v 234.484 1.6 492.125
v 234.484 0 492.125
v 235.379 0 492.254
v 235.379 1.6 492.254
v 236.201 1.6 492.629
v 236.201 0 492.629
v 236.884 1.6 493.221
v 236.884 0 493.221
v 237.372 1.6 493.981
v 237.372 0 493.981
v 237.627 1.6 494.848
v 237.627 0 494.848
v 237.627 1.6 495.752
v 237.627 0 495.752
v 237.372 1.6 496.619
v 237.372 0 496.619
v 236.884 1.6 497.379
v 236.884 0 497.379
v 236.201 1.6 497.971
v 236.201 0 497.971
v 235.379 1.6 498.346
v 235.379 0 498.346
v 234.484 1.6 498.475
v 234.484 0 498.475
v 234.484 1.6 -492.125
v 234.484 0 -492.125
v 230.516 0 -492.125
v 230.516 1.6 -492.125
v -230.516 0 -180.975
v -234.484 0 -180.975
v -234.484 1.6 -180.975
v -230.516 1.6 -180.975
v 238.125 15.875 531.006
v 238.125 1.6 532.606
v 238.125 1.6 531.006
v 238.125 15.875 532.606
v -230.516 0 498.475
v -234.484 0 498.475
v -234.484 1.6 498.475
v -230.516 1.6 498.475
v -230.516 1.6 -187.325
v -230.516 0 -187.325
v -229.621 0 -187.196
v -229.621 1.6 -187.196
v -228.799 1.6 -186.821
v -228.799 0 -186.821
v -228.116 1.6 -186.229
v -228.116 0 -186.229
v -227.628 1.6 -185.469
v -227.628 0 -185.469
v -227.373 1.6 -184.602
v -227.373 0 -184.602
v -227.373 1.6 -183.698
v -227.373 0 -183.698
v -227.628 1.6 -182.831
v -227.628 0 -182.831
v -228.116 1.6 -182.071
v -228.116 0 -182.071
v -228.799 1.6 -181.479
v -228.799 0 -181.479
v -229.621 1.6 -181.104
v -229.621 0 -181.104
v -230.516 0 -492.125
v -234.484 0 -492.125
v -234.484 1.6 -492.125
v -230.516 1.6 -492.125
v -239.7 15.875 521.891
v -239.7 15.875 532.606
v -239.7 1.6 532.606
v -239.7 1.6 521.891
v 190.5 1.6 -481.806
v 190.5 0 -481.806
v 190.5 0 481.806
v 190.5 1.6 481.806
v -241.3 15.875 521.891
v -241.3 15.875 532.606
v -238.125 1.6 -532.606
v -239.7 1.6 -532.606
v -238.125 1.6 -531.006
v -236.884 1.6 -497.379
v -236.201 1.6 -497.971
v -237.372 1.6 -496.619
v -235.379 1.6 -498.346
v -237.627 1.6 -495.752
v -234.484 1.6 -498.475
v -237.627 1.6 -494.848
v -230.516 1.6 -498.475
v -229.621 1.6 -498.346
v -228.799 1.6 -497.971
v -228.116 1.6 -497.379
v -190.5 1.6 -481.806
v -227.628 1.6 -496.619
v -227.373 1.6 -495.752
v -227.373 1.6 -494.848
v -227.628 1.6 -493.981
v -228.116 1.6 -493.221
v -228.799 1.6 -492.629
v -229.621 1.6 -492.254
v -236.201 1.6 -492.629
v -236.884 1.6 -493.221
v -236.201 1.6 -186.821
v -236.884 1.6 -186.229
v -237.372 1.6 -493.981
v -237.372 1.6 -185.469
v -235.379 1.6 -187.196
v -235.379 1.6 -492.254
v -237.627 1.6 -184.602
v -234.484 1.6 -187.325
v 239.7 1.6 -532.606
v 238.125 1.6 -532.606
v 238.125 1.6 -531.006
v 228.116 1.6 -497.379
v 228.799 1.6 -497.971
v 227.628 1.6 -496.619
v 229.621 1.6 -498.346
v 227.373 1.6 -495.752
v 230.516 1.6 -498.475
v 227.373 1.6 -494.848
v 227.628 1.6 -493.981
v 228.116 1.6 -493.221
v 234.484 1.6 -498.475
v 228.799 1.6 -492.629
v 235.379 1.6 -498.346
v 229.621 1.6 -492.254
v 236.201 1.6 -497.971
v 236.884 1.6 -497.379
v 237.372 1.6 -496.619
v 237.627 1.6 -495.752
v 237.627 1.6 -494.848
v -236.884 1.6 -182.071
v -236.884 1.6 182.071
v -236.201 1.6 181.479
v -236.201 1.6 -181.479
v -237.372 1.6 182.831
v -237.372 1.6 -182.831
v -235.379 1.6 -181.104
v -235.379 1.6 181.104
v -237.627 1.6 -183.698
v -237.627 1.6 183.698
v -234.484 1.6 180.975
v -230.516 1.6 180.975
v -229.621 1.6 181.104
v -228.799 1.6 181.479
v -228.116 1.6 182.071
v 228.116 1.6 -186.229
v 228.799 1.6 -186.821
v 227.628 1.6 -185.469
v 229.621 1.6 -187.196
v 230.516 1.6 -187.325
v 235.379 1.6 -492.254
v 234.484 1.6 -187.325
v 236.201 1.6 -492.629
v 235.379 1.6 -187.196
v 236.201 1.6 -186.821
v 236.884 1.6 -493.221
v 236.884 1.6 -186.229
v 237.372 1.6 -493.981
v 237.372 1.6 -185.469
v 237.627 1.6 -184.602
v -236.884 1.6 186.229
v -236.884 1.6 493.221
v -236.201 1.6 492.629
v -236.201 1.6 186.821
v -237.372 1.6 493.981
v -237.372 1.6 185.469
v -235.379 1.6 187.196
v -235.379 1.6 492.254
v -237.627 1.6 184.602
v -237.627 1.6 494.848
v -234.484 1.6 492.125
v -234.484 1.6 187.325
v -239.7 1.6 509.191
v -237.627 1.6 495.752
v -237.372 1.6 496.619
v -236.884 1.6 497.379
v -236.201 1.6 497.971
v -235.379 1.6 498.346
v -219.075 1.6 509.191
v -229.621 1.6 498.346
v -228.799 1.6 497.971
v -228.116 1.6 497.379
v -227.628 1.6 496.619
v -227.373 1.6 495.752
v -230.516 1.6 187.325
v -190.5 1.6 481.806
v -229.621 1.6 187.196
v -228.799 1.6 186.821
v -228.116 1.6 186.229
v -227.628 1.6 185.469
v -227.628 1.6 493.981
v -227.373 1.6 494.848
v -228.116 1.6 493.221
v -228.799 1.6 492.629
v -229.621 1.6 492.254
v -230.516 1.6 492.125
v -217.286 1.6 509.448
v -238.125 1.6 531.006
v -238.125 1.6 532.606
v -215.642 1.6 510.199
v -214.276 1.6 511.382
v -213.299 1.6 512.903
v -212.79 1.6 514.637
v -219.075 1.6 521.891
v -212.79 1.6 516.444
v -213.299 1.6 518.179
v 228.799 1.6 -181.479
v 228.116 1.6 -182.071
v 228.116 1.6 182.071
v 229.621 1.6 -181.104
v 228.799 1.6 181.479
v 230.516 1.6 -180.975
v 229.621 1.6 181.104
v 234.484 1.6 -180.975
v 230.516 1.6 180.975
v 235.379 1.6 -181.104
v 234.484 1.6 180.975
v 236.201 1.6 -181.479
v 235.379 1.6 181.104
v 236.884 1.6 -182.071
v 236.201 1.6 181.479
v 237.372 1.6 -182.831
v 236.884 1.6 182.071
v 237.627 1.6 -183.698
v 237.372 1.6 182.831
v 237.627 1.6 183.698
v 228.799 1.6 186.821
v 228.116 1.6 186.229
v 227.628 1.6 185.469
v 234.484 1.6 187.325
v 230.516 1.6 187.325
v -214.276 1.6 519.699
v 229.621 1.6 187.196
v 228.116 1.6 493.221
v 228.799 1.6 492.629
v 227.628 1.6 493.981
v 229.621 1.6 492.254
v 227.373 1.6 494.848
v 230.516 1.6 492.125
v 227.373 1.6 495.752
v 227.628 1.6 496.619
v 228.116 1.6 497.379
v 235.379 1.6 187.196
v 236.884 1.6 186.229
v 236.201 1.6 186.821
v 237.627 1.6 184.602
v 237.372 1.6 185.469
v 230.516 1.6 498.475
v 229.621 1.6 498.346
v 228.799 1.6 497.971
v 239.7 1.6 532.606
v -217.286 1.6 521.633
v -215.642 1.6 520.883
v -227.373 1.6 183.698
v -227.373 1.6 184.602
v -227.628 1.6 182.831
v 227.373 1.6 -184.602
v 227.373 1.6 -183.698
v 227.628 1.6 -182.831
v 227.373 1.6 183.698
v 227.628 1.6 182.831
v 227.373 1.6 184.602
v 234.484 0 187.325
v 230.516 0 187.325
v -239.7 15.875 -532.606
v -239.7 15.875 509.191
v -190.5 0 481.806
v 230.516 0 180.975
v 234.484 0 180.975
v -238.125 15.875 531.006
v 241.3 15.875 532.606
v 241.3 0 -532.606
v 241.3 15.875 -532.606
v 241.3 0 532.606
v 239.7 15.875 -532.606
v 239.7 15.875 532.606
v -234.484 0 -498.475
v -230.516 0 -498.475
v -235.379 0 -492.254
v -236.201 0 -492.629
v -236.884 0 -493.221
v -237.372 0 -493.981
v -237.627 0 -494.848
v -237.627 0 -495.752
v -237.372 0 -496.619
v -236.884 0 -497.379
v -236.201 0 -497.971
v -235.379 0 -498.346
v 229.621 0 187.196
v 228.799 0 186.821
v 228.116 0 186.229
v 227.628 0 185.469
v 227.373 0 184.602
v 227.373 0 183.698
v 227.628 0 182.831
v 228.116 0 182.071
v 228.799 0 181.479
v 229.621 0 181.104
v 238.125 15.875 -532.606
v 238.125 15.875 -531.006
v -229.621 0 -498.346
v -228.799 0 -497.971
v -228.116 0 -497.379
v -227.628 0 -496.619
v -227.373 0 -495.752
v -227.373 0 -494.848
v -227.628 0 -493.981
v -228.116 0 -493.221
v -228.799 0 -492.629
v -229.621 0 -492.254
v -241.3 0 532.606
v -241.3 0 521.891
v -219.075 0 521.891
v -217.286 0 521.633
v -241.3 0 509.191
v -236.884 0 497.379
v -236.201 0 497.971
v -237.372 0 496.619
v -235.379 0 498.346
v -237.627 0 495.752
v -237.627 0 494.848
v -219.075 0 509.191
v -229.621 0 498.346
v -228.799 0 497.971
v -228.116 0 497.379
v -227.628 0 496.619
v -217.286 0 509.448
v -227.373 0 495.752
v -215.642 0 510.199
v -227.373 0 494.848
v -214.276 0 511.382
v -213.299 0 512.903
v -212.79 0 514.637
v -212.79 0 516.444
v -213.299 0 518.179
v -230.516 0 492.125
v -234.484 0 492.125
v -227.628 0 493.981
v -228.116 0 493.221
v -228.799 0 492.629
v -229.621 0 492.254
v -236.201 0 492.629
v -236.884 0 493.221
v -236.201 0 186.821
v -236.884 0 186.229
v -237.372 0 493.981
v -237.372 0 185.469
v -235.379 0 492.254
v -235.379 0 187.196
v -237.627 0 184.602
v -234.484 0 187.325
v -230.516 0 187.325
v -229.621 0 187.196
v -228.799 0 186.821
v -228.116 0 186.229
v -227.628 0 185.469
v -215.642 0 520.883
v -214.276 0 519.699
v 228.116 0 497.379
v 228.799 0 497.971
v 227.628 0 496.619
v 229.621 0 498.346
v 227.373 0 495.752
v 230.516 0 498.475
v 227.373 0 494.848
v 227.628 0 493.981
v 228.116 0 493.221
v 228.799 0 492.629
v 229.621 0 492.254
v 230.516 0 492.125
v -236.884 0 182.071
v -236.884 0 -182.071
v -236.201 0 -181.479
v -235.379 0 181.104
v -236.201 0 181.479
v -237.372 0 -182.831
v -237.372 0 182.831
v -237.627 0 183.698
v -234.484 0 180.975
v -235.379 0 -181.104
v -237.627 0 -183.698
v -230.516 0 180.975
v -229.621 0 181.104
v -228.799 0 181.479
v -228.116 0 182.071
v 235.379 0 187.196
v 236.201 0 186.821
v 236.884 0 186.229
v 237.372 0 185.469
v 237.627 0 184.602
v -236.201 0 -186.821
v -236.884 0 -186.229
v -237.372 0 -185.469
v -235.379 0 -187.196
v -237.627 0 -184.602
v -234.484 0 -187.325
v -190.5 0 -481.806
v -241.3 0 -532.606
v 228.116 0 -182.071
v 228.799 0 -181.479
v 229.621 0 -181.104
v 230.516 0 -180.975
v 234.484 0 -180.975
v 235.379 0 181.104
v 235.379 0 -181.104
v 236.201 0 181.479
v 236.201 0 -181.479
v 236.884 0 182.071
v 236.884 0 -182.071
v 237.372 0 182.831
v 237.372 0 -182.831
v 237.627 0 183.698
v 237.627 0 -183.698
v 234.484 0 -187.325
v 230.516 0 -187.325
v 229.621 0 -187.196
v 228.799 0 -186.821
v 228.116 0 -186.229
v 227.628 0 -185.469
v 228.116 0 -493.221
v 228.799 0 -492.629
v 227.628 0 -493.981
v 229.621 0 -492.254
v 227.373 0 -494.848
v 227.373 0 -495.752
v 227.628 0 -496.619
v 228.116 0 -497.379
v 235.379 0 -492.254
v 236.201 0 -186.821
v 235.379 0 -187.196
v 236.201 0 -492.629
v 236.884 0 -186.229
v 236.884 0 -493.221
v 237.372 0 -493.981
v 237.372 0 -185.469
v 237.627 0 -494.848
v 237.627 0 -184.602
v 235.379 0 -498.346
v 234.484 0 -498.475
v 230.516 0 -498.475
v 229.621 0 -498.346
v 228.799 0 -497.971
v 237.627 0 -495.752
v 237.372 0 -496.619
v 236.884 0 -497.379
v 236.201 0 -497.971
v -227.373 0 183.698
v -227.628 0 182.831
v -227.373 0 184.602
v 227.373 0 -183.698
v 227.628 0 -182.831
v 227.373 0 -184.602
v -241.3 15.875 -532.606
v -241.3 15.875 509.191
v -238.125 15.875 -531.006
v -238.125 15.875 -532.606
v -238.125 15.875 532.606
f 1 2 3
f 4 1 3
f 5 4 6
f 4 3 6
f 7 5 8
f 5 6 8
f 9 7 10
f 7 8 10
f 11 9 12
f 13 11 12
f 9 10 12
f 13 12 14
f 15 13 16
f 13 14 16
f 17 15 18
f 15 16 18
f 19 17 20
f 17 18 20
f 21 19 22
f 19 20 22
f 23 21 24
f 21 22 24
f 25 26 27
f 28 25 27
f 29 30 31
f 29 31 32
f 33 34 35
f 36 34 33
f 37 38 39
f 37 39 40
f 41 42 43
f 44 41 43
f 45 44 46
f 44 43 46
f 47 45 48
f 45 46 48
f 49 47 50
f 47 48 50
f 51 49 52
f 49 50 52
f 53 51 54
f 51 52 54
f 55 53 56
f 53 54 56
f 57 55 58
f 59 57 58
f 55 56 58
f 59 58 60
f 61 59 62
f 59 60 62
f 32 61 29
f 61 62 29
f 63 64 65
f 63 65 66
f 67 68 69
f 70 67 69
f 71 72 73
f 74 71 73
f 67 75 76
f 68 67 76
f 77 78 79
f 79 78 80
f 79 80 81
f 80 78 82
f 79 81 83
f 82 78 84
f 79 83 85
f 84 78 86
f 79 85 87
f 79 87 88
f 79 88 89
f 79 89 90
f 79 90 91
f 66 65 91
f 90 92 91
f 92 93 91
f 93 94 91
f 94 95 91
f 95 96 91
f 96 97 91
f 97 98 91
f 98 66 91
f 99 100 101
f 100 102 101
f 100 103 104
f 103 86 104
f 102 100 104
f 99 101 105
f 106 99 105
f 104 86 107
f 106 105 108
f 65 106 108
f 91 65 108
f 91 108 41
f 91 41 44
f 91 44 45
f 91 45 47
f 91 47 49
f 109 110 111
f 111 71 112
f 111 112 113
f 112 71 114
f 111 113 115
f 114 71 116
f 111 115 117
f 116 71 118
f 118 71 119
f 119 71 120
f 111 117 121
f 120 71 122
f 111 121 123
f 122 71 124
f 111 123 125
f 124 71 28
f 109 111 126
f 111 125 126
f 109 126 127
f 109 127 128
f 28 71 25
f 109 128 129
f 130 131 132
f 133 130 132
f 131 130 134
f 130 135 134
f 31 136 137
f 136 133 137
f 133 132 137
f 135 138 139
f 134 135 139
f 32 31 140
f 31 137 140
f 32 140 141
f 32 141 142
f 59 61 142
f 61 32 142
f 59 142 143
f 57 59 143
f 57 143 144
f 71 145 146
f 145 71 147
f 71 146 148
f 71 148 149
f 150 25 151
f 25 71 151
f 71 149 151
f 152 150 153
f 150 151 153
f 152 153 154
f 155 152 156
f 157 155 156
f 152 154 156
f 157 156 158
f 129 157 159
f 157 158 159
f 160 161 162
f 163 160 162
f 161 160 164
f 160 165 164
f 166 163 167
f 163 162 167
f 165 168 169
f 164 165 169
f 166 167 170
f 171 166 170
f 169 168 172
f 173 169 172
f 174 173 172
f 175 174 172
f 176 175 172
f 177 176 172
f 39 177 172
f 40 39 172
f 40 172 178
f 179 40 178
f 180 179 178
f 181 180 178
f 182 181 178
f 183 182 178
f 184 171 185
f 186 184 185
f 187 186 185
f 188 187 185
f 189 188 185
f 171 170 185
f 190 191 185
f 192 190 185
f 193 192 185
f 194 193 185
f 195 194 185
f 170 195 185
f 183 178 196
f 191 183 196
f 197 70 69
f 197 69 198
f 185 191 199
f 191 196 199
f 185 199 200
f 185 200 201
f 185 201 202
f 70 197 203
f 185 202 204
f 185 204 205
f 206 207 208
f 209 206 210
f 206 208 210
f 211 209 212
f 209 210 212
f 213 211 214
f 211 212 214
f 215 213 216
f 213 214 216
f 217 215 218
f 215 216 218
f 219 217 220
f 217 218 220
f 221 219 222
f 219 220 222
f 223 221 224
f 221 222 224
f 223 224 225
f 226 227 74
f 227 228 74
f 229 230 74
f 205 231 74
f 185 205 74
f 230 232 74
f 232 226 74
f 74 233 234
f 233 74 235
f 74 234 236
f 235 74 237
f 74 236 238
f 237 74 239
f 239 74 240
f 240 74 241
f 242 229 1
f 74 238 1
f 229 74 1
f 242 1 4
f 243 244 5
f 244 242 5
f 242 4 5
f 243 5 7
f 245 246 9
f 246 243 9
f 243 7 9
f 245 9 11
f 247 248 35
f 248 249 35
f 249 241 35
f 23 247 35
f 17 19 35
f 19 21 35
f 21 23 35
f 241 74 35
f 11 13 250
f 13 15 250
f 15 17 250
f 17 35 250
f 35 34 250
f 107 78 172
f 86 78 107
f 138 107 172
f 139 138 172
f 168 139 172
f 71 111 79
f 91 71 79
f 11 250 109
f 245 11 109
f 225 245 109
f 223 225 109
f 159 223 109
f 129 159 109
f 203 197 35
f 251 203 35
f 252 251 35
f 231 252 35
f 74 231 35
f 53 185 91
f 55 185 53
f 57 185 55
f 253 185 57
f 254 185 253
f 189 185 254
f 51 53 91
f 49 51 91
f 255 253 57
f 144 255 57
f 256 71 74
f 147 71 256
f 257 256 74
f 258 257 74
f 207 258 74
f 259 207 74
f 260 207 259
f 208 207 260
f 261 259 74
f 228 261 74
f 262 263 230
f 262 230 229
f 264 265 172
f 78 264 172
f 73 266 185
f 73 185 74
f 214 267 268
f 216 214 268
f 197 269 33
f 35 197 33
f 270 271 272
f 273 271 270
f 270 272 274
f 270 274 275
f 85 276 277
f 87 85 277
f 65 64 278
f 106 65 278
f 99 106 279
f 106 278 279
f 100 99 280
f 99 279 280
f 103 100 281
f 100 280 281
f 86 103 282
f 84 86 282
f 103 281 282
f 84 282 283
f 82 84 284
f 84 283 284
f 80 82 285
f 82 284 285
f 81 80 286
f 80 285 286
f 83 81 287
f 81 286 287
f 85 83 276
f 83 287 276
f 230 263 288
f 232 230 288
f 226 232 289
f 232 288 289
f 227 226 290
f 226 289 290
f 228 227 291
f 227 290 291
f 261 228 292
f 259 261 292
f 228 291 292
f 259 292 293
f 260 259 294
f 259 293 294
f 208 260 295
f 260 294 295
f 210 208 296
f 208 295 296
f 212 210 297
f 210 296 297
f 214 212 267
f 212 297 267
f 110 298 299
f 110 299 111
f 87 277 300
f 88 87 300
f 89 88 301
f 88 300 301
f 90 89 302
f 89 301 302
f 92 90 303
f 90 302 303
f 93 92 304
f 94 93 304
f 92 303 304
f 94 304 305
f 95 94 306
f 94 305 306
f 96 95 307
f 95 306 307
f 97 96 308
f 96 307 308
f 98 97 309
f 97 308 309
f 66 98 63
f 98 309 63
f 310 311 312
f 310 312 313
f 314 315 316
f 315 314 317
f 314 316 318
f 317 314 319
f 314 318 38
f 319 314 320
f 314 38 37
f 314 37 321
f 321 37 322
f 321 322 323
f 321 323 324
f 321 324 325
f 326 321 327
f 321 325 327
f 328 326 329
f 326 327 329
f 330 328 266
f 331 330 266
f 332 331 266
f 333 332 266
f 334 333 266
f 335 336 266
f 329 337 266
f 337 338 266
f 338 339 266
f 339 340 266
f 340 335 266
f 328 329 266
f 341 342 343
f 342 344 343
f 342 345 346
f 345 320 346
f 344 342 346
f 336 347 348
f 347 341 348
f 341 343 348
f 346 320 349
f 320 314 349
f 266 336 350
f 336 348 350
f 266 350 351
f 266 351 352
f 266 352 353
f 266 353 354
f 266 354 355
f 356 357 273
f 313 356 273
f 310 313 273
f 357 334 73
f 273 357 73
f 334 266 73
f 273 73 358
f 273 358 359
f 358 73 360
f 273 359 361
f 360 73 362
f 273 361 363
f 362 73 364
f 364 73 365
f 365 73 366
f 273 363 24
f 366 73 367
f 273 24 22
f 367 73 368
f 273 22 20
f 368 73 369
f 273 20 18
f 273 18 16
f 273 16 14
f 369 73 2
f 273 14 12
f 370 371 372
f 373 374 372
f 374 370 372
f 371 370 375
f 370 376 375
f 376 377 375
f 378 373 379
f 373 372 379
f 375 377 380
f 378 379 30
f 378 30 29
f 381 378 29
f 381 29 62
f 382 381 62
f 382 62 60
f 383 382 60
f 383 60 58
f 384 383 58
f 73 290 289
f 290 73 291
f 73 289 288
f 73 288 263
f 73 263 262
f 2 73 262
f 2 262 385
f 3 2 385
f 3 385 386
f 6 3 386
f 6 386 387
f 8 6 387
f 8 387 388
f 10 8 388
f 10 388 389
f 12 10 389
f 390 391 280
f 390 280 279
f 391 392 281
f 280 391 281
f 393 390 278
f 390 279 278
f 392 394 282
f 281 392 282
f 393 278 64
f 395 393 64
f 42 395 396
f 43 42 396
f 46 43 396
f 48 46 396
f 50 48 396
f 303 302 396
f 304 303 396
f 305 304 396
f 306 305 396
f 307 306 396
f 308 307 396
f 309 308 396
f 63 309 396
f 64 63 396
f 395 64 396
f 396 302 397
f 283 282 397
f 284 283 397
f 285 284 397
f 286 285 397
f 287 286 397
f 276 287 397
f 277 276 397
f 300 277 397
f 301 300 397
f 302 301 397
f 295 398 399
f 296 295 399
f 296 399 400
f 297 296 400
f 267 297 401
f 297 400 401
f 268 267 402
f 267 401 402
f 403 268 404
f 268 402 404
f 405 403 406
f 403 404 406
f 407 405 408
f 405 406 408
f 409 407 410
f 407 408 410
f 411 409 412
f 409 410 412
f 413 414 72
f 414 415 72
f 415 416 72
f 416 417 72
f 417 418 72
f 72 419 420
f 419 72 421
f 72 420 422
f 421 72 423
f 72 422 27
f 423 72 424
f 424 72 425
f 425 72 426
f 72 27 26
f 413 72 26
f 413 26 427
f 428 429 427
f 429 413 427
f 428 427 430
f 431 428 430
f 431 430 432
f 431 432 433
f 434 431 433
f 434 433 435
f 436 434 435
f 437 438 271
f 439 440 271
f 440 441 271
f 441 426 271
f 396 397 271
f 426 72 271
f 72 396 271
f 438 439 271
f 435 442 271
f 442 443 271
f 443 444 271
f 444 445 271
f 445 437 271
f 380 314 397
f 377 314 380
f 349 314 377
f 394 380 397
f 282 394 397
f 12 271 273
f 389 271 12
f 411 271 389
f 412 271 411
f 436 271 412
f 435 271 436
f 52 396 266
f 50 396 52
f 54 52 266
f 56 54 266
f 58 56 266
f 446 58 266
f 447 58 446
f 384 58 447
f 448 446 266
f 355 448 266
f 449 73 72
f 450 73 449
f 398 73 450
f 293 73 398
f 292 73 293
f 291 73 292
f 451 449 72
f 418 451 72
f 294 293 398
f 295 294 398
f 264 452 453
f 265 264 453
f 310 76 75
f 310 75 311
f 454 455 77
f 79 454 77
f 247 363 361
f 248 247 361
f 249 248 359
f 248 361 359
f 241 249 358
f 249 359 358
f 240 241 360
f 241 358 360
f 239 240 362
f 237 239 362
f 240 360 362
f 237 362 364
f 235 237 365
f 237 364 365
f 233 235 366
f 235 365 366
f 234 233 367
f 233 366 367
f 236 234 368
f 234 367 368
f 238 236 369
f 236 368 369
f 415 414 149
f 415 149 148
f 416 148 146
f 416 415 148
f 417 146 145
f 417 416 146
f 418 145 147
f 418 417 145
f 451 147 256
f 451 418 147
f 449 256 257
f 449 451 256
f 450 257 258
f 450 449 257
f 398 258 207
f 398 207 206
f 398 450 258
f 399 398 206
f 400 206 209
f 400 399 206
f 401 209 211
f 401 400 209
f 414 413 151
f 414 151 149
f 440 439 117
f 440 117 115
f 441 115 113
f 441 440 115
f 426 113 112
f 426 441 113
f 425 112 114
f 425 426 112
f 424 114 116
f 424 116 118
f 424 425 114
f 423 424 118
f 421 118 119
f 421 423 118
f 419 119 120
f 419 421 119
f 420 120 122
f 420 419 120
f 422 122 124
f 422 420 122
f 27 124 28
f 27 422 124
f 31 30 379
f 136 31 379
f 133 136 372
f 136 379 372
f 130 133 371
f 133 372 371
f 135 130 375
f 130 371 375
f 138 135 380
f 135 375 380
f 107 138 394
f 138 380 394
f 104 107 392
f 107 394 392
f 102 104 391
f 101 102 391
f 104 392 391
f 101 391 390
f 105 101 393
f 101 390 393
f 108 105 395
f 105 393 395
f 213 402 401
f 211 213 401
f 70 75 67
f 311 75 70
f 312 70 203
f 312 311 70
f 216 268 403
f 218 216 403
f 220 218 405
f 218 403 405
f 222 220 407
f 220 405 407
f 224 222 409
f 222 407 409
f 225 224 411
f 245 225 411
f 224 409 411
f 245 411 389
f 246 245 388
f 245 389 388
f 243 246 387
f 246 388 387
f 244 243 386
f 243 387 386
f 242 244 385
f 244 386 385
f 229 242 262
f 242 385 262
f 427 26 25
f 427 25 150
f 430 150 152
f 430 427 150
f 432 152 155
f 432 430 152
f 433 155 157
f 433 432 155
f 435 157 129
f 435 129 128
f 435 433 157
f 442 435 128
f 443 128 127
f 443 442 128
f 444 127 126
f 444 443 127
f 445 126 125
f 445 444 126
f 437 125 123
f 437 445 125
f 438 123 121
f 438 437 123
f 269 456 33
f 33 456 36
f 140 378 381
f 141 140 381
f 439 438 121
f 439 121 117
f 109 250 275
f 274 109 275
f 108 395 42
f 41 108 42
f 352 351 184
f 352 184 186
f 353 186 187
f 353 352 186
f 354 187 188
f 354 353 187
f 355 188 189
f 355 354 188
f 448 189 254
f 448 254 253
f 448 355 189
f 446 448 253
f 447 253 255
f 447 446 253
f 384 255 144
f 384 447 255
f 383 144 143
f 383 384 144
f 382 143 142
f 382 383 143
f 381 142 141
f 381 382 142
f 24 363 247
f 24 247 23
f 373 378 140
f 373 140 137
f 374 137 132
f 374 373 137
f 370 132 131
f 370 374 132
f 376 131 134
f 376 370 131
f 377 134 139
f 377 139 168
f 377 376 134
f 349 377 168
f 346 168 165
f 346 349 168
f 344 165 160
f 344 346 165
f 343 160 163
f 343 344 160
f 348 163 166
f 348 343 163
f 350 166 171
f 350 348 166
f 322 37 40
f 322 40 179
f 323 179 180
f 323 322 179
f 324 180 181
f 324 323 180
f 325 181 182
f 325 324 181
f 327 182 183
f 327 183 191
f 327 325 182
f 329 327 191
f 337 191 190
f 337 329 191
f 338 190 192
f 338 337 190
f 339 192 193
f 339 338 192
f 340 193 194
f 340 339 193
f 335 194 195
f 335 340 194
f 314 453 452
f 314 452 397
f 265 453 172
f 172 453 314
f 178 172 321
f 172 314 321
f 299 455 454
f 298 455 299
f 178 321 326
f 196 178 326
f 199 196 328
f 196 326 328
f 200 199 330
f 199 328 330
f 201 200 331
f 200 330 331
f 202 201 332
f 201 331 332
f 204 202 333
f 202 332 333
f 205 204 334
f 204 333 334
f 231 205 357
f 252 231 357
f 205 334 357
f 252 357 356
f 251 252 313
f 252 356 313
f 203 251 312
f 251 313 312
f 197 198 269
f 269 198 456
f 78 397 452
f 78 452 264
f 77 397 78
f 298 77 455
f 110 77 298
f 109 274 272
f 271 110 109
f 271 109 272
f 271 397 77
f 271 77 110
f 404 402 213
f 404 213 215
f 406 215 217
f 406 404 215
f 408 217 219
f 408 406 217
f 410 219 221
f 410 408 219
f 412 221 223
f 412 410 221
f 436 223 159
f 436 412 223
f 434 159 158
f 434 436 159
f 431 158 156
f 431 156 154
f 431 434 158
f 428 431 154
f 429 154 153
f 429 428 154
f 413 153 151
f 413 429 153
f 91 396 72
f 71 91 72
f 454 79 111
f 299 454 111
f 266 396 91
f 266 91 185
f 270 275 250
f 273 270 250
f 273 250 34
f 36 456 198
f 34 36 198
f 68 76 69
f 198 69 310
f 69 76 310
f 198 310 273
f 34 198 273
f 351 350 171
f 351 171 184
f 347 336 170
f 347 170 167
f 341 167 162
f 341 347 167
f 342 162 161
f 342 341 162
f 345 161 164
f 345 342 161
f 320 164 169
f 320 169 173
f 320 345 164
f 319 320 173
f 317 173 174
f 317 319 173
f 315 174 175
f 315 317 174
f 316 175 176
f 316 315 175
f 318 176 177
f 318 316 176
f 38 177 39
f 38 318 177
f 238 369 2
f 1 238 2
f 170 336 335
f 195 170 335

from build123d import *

# Parameters (mm, degrees)
F0_W              = 482.6
F0_H              = 1065.2125
F1_DEPTH          = 1.6
F2_W              = 15.875
F2_H              = 1065.2125
F3_DEPTH          = 1.6
F4_W              = 15.875
F4_H              = 1065.2125
F5_DEPTH          = 1.6
F6_W              = 476.25
F6_H              = 15.875
F7_DEPTH          = 1.6
F8_W              = 476.25
F8_H              = 15.875
F9_DEPTH          = 1.6
F10_W             = 381
F10_H             = 963.6125
F11_DEPTH         = 1.6
F12_W             = 3.96875
F12_H             = 6.35
F13_DEPTH         = 1.6
F13_COPIES3_COUNT = 2
F13_COPIES3_PITCH = 1094.309536
F13_COPIES4_COUNT = 2
F13_COPIES4_PITCH = 823.333045
F14_W             = 3.96875
F14_H             = 6.35
F15_DEPTH         = 1.6
F16_W             = 22.225
F16_H             = 12.7
F17_DEPTH         = 16


# Not quite as in the source:
# - a pattern or mirror of a feature is missing from the dataset's text; its kind, count and spacing are read off the source's solid


with BuildPart() as f1:
    # F0 (on Front) → F1 (new body)
    with BuildSketch(Plane.XZ):
        Rectangle(F0_W, F0_H)
    extrude(amount=-F1_DEPTH)

    # F2 (on face) → F3 (join)
    with BuildSketch(Plane(origin=(-241.3, 0, 0), x_dir=(0, -1, 0), z_dir=(-1, 0, 0))):
        with Locations((-7.9375, 0)):
            Rectangle(F2_W, F2_H)
    extrude(amount=-F3_DEPTH)

    # F4 (on face) → F5 (join)
    with BuildSketch(Plane.YZ.offset(241.3)):
        with Locations((7.9375, 0)):
            Rectangle(F4_W, F4_H)
    extrude(amount=-F5_DEPTH)

    # F6 (on face) → F7 (join)
    with BuildSketch(Plane.XY.offset(532.60625)):
        with Locations((0, 7.9375)):
            Rectangle(F6_W, F6_H)
    extrude(amount=-F7_DEPTH)

    # F8 (on face) → F9 (join)
    with BuildSketch(Plane(origin=(0, 0, -532.60625), x_dir=(1, 0, 0), z_dir=(0, 0, -1))):
        with Locations((0, -7.9375)):
            Rectangle(F8_W, F8_H)
    extrude(amount=-F9_DEPTH)

    # F10 (on face) → F11 (cut)
    with BuildSketch(Plane.XZ):
        Rectangle(F10_W, F10_H)
    extrude(amount=-F11_DEPTH, mode=Mode.SUBTRACT)

    # F12 (on face) → F13 (cut)
    with BuildSketch(Plane.XZ):
        with Locations((-232.5, -495.3)):
            Rectangle(F12_W, F12_H)
        with BuildLine():
            Line((-230.515625, -492.125), (-230.515625, -498.475))
            ThreePointArc((-230.515625, -498.475), (-227.340625, -495.3), (-230.515625, -492.125))
        make_face()
        with BuildLine():
            ThreePointArc((-234.484375, -492.125), (-237.659375, -495.3), (-234.484375, -498.475))
            Line((-234.484375, -498.475), (-234.484375, -492.125))
        make_face()
    f13 = extrude(amount=-F13_DEPTH, mode=Mode.SUBTRACT)

    # F13_copies: F13 across plane
    add(f13.mirror(Plane.XY), mode=Mode.SUBTRACT)

    # F13_copies1: F13 across plane
    add(f13.mirror(Plane.XY.offset(-155.575)), mode=Mode.SUBTRACT)

    # F13_copies2: F13 across plane
    add(f13.mirror(Plane(origin=(0, 0, 0), x_dir=(0, 0, 1), z_dir=(1, 0, 0))), mode=Mode.SUBTRACT)

    # F13_copies3: F13 ×2
    with Locations(*[Vector(0.4249254757, 0, 0.9052283359) * (i * F13_COPIES3_PITCH) for i in range(1, F13_COPIES3_COUNT)]):
        add(f13, mode=Mode.SUBTRACT)

    # F13_copies4: F13 ×2
    with Locations(*[Vector(0.5647775259, 0, 0.8252432043) * (i * F13_COPIES4_PITCH) for i in range(1, F13_COPIES4_COUNT)]):
        add(f13, mode=Mode.SUBTRACT)

    # F14 (on face) → F15 (cut)
    with BuildSketch(Plane.XZ):
        with Locations((-232.5, -184.15)):
            Rectangle(F14_W, F14_H)
        with BuildLine():
            Line((-230.515625, -180.975), (-230.515625, -187.325))
            ThreePointArc((-230.515625, -187.325), (-227.340625, -184.15), (-230.515625, -180.975))
        make_face()
        with BuildLine():
            ThreePointArc((-234.484375, -180.975), (-237.659375, -184.15), (-234.484375, -187.325))
            Line((-234.484375, -187.325), (-234.484375, -180.975))
        make_face()
    f15 = extrude(amount=-F15_DEPTH, mode=Mode.SUBTRACT)

    # F15_copies: F15 across plane
    add(f15.mirror(Plane(origin=(0, 0, 0), x_dir=(0, 0, 1), z_dir=(1, 0, 0))), mode=Mode.SUBTRACT)

    # F16 (on face) → F17 (cut)
    with BuildSketch(Plane.XZ):
        with Locations((-230.1875, 515.540625)):
            Rectangle(F16_W, F16_H)
        with BuildLine():
            Line((-219.075, 521.890625), (-219.075, 509.190625))
            ThreePointArc((-219.075, 509.190625), (-212.725, 515.540625), (-219.075, 521.890625))
        make_face()
    extrude(amount=-F17_DEPTH, mode=Mode.SUBTRACT)


solid = f1.part
